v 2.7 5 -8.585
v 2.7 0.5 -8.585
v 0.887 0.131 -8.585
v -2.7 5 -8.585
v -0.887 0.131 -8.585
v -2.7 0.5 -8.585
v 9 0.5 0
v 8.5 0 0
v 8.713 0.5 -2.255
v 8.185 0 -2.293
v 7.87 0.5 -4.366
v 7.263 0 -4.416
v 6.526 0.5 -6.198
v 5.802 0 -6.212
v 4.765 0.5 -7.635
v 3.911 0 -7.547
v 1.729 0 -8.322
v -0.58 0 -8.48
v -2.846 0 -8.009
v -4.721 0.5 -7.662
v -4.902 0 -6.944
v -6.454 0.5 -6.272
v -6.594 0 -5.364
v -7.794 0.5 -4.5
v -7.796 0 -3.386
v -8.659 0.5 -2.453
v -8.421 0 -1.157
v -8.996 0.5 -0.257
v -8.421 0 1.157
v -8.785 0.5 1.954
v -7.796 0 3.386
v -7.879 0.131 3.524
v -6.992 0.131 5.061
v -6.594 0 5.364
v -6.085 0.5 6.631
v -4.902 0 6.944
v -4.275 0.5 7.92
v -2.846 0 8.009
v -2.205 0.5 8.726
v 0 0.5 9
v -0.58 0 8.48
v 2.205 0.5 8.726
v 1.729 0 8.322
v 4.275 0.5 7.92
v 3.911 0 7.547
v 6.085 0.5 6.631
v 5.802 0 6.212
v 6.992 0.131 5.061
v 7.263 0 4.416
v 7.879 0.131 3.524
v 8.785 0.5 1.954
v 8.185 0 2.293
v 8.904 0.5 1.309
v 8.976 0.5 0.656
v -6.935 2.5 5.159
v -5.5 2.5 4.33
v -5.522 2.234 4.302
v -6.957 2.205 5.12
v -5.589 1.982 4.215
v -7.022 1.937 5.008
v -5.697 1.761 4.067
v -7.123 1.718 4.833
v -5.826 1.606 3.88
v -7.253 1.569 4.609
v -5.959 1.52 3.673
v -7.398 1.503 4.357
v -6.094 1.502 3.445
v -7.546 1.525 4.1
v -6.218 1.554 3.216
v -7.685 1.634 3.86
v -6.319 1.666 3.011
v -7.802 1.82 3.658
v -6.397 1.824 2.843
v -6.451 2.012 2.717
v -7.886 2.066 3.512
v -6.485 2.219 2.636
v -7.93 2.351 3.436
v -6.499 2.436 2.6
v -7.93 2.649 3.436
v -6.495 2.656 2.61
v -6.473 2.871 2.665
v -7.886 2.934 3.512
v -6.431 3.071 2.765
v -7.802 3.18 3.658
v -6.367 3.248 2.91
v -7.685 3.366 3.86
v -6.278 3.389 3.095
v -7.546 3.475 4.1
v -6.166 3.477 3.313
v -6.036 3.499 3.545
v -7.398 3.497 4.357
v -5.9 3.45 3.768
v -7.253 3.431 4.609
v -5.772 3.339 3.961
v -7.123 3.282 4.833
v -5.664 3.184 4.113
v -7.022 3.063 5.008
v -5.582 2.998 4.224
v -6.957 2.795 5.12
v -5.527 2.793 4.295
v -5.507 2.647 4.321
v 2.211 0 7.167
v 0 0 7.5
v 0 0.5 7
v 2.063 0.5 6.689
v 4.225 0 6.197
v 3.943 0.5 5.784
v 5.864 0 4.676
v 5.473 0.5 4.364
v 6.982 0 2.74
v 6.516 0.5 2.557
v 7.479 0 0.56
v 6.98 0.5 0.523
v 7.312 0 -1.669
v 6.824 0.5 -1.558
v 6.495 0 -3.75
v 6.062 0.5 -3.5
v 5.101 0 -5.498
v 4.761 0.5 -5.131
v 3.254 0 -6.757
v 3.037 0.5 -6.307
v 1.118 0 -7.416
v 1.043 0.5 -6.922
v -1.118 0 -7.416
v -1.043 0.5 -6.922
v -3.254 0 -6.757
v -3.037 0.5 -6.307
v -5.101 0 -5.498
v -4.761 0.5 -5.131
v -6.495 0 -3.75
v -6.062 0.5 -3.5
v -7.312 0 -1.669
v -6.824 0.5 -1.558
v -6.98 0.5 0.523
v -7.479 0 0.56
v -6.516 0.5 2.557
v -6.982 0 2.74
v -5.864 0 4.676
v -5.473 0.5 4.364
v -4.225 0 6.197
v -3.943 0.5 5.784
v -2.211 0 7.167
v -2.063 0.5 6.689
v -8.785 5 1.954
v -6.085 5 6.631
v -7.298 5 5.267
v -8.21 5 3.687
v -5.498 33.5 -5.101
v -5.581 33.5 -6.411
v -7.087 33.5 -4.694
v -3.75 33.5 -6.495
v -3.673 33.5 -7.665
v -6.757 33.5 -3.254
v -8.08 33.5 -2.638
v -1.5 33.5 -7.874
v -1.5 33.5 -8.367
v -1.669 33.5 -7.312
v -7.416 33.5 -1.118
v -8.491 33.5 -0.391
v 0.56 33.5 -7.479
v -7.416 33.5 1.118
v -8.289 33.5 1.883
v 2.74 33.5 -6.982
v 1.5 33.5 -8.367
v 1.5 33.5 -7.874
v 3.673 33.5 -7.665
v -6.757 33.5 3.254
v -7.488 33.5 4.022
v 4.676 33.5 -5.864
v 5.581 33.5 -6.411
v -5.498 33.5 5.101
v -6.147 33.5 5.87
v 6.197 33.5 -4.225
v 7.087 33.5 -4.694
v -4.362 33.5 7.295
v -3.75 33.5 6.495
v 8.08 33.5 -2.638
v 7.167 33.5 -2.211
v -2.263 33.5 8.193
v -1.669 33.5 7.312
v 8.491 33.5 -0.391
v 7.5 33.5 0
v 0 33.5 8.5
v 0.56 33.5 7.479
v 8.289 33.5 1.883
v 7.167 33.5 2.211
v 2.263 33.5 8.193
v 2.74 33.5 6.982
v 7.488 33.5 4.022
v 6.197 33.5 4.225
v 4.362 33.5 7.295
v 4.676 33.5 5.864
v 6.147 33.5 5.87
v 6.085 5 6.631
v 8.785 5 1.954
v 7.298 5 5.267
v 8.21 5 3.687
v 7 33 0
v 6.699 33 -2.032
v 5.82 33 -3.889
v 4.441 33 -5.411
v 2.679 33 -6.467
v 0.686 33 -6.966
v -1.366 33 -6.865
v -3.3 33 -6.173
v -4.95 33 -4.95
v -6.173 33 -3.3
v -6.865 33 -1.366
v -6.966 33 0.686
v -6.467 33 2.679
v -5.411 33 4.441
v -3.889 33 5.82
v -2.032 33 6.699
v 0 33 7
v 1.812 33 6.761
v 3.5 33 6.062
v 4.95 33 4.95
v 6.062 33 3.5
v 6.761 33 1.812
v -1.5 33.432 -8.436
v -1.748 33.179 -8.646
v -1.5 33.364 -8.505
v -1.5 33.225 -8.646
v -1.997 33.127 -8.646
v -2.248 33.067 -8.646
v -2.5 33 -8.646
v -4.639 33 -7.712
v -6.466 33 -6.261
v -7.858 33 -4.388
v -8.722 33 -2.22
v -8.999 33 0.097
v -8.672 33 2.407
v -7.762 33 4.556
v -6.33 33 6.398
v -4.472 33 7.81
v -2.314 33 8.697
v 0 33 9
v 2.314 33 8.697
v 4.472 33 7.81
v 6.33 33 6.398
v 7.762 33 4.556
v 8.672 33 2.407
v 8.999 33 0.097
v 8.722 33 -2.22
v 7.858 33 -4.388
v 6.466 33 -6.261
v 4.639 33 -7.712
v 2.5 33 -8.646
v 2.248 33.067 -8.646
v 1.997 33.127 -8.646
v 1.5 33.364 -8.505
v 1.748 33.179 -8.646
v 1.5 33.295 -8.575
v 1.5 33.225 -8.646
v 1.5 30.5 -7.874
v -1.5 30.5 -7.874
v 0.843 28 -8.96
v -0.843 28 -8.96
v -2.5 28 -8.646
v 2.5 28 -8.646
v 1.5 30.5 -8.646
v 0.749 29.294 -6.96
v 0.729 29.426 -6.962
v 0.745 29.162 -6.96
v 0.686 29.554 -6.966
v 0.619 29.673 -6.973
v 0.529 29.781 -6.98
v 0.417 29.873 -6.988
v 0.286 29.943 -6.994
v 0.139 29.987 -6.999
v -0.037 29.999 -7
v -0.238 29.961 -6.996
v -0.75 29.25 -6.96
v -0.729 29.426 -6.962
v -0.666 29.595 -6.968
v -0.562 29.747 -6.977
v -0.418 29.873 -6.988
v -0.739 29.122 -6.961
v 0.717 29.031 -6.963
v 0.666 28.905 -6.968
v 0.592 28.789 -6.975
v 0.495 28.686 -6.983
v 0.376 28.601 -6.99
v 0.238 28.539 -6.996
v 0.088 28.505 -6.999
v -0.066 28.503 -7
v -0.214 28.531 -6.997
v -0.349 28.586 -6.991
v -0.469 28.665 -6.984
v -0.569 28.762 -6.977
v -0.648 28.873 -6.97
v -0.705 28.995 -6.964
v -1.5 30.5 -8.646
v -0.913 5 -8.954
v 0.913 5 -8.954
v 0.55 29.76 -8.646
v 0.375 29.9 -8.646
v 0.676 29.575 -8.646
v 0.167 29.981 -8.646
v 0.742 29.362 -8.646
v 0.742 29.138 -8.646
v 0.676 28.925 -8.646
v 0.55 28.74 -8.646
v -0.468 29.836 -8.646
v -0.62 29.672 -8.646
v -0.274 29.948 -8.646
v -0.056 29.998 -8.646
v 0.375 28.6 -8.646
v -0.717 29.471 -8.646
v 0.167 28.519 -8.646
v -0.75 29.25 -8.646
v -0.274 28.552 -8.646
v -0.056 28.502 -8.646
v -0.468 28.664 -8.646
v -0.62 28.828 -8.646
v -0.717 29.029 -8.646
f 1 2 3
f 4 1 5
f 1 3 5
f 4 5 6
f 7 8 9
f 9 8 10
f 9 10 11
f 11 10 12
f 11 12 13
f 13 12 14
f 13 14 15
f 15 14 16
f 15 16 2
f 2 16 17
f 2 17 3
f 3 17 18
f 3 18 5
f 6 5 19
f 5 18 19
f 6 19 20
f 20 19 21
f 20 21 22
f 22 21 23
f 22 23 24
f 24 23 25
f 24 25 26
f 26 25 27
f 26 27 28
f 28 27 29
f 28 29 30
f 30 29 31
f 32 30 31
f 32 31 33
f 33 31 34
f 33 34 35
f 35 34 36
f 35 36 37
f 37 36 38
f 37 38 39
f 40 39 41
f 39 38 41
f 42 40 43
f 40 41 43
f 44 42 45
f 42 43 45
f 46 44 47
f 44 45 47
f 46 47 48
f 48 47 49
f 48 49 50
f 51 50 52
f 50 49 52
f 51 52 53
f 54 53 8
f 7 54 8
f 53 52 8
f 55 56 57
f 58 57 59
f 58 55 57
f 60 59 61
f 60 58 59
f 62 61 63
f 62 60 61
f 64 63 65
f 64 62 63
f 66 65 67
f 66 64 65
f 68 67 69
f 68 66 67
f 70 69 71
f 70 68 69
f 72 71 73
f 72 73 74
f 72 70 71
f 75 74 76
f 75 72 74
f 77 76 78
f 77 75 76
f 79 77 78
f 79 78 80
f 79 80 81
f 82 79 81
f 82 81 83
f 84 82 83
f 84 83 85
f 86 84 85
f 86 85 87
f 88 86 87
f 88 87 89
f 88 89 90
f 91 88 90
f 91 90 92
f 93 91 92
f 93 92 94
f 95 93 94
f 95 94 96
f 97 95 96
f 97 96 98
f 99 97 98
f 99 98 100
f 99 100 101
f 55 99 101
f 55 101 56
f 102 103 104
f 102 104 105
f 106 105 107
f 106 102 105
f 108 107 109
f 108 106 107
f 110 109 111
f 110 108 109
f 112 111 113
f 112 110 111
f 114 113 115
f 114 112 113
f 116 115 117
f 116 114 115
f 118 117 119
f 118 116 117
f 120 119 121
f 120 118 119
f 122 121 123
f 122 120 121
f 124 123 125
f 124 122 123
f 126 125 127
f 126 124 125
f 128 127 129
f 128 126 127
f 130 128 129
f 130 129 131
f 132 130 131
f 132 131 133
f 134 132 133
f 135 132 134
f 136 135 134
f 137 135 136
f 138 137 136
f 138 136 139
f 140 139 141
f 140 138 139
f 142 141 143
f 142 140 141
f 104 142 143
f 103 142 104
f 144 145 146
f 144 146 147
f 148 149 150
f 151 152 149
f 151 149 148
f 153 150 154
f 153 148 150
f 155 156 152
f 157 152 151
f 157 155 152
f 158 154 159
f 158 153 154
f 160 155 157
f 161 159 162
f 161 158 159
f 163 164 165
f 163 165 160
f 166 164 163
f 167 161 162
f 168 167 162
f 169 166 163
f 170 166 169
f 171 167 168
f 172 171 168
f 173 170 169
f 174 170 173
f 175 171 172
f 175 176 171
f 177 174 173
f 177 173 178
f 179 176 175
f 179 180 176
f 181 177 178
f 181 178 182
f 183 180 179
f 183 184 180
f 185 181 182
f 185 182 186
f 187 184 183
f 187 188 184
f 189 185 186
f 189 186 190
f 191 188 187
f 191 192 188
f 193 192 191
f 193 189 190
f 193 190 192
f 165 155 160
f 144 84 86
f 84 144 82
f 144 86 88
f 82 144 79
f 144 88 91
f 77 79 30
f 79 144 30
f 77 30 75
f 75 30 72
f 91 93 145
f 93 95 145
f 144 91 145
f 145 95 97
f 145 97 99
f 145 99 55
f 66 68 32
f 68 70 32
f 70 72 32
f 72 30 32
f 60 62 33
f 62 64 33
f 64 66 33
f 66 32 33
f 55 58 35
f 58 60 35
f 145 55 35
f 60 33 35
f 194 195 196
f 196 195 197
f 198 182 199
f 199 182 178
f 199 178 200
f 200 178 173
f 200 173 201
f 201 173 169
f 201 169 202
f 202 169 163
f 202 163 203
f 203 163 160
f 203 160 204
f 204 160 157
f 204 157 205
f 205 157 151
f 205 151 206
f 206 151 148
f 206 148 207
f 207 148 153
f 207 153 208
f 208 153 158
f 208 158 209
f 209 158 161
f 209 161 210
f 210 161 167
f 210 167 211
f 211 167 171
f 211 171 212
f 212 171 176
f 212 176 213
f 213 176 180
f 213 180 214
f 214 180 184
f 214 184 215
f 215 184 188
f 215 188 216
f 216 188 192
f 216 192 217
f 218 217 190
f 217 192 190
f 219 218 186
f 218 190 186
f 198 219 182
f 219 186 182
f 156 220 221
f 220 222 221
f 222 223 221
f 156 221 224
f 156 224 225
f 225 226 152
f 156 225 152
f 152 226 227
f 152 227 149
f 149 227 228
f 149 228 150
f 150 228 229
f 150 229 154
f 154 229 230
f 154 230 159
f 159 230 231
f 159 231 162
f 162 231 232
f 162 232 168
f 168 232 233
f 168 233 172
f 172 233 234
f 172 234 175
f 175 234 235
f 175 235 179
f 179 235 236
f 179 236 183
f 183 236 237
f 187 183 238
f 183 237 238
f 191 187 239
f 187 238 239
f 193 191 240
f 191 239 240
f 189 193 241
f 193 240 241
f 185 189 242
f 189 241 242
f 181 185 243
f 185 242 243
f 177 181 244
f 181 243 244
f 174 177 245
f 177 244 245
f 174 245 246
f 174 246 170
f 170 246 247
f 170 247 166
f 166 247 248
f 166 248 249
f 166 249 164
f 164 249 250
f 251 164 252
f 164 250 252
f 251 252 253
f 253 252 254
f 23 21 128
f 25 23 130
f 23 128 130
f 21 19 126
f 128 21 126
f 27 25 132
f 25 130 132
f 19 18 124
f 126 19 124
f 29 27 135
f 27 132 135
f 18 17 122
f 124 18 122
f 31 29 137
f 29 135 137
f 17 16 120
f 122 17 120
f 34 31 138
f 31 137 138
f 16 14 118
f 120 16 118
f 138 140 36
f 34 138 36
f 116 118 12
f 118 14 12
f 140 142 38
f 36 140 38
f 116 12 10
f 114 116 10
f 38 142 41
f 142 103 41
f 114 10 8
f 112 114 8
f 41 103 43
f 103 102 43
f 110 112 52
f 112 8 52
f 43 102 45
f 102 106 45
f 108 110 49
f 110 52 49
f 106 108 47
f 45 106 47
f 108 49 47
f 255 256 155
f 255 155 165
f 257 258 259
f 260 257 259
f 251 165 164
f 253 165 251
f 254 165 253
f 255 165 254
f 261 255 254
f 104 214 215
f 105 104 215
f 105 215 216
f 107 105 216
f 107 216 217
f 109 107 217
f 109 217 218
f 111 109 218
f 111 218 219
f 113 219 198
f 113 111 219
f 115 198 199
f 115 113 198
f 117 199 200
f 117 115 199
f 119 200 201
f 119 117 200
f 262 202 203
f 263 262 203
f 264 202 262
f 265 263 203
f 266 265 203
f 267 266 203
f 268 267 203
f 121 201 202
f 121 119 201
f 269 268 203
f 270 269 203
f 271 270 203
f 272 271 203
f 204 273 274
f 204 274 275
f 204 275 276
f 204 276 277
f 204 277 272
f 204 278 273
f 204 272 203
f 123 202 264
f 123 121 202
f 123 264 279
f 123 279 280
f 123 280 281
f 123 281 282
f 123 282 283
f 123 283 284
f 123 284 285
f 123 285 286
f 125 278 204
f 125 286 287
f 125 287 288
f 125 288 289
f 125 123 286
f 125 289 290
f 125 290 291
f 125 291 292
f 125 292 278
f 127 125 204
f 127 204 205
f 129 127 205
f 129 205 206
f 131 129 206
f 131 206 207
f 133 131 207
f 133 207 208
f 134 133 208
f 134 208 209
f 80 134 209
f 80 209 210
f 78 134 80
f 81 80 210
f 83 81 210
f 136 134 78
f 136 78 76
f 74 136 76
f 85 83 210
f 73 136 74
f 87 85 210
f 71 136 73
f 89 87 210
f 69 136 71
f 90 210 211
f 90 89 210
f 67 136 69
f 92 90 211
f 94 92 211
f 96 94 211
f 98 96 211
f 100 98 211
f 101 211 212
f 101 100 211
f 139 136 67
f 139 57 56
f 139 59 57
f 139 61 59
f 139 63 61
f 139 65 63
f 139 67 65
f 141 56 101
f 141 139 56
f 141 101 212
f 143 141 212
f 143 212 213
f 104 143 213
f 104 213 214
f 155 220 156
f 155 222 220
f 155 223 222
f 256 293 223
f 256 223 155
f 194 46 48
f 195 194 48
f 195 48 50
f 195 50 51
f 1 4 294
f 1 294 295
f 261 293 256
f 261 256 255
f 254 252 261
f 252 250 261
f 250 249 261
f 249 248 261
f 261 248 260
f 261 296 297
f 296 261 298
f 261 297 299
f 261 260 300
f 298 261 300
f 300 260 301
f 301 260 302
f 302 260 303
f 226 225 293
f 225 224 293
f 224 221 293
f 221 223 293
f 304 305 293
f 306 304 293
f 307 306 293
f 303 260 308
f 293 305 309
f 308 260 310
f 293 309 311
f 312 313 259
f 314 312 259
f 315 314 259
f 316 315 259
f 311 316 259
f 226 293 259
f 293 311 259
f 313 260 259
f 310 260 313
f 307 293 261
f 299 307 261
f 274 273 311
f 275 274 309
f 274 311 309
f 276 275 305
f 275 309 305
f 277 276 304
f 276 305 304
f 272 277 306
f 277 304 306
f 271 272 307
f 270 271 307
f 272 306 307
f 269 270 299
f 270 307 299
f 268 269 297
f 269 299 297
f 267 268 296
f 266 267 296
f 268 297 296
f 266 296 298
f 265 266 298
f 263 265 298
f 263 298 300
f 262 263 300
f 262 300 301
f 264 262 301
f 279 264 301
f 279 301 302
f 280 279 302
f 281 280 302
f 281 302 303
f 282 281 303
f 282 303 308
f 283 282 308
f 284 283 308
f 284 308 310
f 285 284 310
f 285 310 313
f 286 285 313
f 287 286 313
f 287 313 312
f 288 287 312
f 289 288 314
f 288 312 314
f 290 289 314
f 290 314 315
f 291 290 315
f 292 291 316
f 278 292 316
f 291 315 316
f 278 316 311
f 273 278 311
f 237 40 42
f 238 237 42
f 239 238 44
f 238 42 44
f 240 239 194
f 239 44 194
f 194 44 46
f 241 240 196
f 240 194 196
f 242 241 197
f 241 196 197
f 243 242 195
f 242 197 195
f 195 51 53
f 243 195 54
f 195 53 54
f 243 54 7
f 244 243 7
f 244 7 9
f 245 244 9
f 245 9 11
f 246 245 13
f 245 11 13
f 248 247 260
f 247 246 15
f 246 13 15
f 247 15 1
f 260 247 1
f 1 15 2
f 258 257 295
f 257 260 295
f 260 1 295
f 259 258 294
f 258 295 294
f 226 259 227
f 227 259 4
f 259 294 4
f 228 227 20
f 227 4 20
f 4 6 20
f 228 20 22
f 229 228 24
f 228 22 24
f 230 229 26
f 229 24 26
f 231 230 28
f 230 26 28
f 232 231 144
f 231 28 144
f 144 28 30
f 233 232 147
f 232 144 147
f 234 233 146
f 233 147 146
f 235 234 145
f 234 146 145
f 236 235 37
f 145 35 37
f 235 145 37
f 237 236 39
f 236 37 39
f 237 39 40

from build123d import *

# Parameters (mm, degrees)
ESQUISSE1_R                  = 9
ESQUISSE1_R_2                = 7
BOSS_EXTRU_1_DEPTH           = 33.5
ENL_V_MAT_EXTRU_1_DEPTH      = 5
ESQUISSE3_R                  = 1
ENL_V_MAT_EXTRU_2_DEPTH      = 1.65725
ENL_V_START                  = -3
ENL_V_MAT_EXTRU_6_DEPTH      = 3
ENL_V_START_2                = -5.5
ENL_V_MAT_EXTRU_3_DEPTH      = 5.5
ENL_V_MAT_EXTRU_4_REACH      = 40.918
ENL_V_MAT_EXTRU_4_END_RADIUS = 7
ESQUISSE5_R                  = 0.75
CHANFREIN2_SIZE              = 0.5


with BuildPart() as part:
    # Esquisse1 → Boss.-Extru.1 (new body)
    with BuildSketch(Plane(origin=(0, 0, 0), x_dir=(1, 0, 0), z_dir=(0, 1, 0))):
        with Locations(Location((0, 0, 0), (0, 0, 270))):
            Circle(ESQUISSE1_R)
        with Locations(Location((0, 0, 0), (0, 0, 270))):
            Circle(ESQUISSE1_R_2, mode=Mode.SUBTRACT)
    extrude(amount=BOSS_EXTRU_1_DEPTH)

    # Esquisse2 → Enlèv. mat.-Extru.1 (cut)
    with BuildSketch(Plane.XZ):
        with BuildLine():
            Line((2.7, -8.585452813), (-2.7, -8.585452813))
            ThreePointArc((-2.7, -8.585452813), (0, -9), (2.7, -8.585452813))
        make_face()
        with BuildLine():
            Line((-8.785220239, 1.954457816), (-6.085220239, 6.630994997))
            ThreePointArc((-6.085220239, 6.630994997), (-7.794228634, 4.5), (-8.785220239, 1.954457816))
        make_face()
        with BuildLine():
            Line((6.085220239, 6.630994997), (8.785220239, 1.954457816))
            ThreePointArc((8.785220239, 1.954457816), (7.794228634, 4.5), (6.085220239, 6.630994997))
        make_face()
    extrude(amount=-ENL_V_MAT_EXTRU_1_DEPTH, mode=Mode.SUBTRACT)

    # Esquisse3 → Enlèv. mat.-Extru.2 (cut)
    with BuildSketch(Plane(origin=(-7.435220239, 0, 4.292726406), x_dir=(-0.49999999999999967, 0, -0.8660254037844389), z_dir=(0.8660254037844389, 0, -0.49999999999999967))):
        with Locations(Location((0, 2.5, 0), (0, 0, 180))):
            Circle(ESQUISSE3_R)
    extrude(amount=ENL_V_MAT_EXTRU_2_DEPTH, mode=Mode.SUBTRACT)

    # Esquisse8 → Enlèv. mat.-Extru.6 (cut)
    with BuildSketch(Plane(origin=(0, 33.5, 0), x_dir=(1, 0, 0), z_dir=(0, 1, 0)).offset(ENL_V_START)):
        with BuildLine():
            Line((-1.5, 8.874119675), (-1.5, 7.874119675))
            Line((-1.5, 7.874119675), (1.5, 7.874119675))
            Line((1.5, 7.874119675), (1.5, 8.874119675))
            ThreePointArc((1.5, 8.874119675), (0, 9), (-1.5, 8.874119675))
        make_face()
    extrude(amount=ENL_V_MAT_EXTRU_6_DEPTH, mode=Mode.SUBTRACT)

    # Esquisse4 → Enlèv. mat.-Extru.3 (cut)
    with BuildSketch(Plane(origin=(0, 33.5, 0), x_dir=(1, 0, 0), z_dir=(0, 1, 0)).offset(ENL_V_START_2)):
        with BuildLine():
            Line((2.5, 8.645808233), (-2.5, 8.645808233))
            ThreePointArc((-2.5, 8.645808233), (0, 9), (2.5, 8.645808233))
        make_face()
    extrude(amount=ENL_V_MAT_EXTRU_3_DEPTH, mode=Mode.SUBTRACT)

    # Enlèv. mat.-Extru.4: up to this cylinder (the profile starts outside it)
    enl_v_mat_extru_4_end = Plane(origin=(0, 29.25, 0), z_dir=(0, -1, 0)) * Cylinder(ENL_V_MAT_EXTRU_4_END_RADIUS, 96.836, mode=Mode.PRIVATE)
    # Esquisse5 → Enlèv. mat.-Extru.4 (cut, up to the surface)
    with BuildSketch(Plane(origin=(0, 0, -8.645808233), x_dir=(-1, 0, 0), z_dir=(0, 0, -1)), mode=Mode.PRIVATE) as enl_v_mat_extru_4_sk1:
        with Locations((0, 29.25)):
            Circle(ESQUISSE5_R)
    enl_v_mat_extru_4_tool1 = extrude(enl_v_mat_extru_4_sk1.sketch, amount=-ENL_V_MAT_EXTRU_4_REACH, mode=Mode.PRIVATE) - enl_v_mat_extru_4_end
    add(enl_v_mat_extru_4_tool1.solids().sort_by_distance((0, 29.25, -8.645808))[0], mode=Mode.SUBTRACT)

    # Chanfrein1: read off the stored shape, not the designer's step
    # Chanfrein1 outline → Chanfrein1 (revolve, cut)
    with BuildSketch(Plane.XY):
        Polygon((7, 33.5), (7, 33), (7.5, 33.5), align=None)
        Polygon((9.000000072, 33.5), (8.5, 33.5), (9, 33), align=None)
        Polygon((9.000000072, 0), (9.000000072, 0.500000072), (8.5, 0), align=None)
    revolve(axis=Axis((0, 0, 0), (0, 1, 0)), mode=Mode.SUBTRACT)

    # Chanfrein2
    chanfrein2_edges = [part.edges().sort_by_distance(p)[0] for p in [
        (0, 0, -7),
    ]]
    chamfer(chanfrein2_edges, length=CHANFREIN2_SIZE)


solid = part.part
